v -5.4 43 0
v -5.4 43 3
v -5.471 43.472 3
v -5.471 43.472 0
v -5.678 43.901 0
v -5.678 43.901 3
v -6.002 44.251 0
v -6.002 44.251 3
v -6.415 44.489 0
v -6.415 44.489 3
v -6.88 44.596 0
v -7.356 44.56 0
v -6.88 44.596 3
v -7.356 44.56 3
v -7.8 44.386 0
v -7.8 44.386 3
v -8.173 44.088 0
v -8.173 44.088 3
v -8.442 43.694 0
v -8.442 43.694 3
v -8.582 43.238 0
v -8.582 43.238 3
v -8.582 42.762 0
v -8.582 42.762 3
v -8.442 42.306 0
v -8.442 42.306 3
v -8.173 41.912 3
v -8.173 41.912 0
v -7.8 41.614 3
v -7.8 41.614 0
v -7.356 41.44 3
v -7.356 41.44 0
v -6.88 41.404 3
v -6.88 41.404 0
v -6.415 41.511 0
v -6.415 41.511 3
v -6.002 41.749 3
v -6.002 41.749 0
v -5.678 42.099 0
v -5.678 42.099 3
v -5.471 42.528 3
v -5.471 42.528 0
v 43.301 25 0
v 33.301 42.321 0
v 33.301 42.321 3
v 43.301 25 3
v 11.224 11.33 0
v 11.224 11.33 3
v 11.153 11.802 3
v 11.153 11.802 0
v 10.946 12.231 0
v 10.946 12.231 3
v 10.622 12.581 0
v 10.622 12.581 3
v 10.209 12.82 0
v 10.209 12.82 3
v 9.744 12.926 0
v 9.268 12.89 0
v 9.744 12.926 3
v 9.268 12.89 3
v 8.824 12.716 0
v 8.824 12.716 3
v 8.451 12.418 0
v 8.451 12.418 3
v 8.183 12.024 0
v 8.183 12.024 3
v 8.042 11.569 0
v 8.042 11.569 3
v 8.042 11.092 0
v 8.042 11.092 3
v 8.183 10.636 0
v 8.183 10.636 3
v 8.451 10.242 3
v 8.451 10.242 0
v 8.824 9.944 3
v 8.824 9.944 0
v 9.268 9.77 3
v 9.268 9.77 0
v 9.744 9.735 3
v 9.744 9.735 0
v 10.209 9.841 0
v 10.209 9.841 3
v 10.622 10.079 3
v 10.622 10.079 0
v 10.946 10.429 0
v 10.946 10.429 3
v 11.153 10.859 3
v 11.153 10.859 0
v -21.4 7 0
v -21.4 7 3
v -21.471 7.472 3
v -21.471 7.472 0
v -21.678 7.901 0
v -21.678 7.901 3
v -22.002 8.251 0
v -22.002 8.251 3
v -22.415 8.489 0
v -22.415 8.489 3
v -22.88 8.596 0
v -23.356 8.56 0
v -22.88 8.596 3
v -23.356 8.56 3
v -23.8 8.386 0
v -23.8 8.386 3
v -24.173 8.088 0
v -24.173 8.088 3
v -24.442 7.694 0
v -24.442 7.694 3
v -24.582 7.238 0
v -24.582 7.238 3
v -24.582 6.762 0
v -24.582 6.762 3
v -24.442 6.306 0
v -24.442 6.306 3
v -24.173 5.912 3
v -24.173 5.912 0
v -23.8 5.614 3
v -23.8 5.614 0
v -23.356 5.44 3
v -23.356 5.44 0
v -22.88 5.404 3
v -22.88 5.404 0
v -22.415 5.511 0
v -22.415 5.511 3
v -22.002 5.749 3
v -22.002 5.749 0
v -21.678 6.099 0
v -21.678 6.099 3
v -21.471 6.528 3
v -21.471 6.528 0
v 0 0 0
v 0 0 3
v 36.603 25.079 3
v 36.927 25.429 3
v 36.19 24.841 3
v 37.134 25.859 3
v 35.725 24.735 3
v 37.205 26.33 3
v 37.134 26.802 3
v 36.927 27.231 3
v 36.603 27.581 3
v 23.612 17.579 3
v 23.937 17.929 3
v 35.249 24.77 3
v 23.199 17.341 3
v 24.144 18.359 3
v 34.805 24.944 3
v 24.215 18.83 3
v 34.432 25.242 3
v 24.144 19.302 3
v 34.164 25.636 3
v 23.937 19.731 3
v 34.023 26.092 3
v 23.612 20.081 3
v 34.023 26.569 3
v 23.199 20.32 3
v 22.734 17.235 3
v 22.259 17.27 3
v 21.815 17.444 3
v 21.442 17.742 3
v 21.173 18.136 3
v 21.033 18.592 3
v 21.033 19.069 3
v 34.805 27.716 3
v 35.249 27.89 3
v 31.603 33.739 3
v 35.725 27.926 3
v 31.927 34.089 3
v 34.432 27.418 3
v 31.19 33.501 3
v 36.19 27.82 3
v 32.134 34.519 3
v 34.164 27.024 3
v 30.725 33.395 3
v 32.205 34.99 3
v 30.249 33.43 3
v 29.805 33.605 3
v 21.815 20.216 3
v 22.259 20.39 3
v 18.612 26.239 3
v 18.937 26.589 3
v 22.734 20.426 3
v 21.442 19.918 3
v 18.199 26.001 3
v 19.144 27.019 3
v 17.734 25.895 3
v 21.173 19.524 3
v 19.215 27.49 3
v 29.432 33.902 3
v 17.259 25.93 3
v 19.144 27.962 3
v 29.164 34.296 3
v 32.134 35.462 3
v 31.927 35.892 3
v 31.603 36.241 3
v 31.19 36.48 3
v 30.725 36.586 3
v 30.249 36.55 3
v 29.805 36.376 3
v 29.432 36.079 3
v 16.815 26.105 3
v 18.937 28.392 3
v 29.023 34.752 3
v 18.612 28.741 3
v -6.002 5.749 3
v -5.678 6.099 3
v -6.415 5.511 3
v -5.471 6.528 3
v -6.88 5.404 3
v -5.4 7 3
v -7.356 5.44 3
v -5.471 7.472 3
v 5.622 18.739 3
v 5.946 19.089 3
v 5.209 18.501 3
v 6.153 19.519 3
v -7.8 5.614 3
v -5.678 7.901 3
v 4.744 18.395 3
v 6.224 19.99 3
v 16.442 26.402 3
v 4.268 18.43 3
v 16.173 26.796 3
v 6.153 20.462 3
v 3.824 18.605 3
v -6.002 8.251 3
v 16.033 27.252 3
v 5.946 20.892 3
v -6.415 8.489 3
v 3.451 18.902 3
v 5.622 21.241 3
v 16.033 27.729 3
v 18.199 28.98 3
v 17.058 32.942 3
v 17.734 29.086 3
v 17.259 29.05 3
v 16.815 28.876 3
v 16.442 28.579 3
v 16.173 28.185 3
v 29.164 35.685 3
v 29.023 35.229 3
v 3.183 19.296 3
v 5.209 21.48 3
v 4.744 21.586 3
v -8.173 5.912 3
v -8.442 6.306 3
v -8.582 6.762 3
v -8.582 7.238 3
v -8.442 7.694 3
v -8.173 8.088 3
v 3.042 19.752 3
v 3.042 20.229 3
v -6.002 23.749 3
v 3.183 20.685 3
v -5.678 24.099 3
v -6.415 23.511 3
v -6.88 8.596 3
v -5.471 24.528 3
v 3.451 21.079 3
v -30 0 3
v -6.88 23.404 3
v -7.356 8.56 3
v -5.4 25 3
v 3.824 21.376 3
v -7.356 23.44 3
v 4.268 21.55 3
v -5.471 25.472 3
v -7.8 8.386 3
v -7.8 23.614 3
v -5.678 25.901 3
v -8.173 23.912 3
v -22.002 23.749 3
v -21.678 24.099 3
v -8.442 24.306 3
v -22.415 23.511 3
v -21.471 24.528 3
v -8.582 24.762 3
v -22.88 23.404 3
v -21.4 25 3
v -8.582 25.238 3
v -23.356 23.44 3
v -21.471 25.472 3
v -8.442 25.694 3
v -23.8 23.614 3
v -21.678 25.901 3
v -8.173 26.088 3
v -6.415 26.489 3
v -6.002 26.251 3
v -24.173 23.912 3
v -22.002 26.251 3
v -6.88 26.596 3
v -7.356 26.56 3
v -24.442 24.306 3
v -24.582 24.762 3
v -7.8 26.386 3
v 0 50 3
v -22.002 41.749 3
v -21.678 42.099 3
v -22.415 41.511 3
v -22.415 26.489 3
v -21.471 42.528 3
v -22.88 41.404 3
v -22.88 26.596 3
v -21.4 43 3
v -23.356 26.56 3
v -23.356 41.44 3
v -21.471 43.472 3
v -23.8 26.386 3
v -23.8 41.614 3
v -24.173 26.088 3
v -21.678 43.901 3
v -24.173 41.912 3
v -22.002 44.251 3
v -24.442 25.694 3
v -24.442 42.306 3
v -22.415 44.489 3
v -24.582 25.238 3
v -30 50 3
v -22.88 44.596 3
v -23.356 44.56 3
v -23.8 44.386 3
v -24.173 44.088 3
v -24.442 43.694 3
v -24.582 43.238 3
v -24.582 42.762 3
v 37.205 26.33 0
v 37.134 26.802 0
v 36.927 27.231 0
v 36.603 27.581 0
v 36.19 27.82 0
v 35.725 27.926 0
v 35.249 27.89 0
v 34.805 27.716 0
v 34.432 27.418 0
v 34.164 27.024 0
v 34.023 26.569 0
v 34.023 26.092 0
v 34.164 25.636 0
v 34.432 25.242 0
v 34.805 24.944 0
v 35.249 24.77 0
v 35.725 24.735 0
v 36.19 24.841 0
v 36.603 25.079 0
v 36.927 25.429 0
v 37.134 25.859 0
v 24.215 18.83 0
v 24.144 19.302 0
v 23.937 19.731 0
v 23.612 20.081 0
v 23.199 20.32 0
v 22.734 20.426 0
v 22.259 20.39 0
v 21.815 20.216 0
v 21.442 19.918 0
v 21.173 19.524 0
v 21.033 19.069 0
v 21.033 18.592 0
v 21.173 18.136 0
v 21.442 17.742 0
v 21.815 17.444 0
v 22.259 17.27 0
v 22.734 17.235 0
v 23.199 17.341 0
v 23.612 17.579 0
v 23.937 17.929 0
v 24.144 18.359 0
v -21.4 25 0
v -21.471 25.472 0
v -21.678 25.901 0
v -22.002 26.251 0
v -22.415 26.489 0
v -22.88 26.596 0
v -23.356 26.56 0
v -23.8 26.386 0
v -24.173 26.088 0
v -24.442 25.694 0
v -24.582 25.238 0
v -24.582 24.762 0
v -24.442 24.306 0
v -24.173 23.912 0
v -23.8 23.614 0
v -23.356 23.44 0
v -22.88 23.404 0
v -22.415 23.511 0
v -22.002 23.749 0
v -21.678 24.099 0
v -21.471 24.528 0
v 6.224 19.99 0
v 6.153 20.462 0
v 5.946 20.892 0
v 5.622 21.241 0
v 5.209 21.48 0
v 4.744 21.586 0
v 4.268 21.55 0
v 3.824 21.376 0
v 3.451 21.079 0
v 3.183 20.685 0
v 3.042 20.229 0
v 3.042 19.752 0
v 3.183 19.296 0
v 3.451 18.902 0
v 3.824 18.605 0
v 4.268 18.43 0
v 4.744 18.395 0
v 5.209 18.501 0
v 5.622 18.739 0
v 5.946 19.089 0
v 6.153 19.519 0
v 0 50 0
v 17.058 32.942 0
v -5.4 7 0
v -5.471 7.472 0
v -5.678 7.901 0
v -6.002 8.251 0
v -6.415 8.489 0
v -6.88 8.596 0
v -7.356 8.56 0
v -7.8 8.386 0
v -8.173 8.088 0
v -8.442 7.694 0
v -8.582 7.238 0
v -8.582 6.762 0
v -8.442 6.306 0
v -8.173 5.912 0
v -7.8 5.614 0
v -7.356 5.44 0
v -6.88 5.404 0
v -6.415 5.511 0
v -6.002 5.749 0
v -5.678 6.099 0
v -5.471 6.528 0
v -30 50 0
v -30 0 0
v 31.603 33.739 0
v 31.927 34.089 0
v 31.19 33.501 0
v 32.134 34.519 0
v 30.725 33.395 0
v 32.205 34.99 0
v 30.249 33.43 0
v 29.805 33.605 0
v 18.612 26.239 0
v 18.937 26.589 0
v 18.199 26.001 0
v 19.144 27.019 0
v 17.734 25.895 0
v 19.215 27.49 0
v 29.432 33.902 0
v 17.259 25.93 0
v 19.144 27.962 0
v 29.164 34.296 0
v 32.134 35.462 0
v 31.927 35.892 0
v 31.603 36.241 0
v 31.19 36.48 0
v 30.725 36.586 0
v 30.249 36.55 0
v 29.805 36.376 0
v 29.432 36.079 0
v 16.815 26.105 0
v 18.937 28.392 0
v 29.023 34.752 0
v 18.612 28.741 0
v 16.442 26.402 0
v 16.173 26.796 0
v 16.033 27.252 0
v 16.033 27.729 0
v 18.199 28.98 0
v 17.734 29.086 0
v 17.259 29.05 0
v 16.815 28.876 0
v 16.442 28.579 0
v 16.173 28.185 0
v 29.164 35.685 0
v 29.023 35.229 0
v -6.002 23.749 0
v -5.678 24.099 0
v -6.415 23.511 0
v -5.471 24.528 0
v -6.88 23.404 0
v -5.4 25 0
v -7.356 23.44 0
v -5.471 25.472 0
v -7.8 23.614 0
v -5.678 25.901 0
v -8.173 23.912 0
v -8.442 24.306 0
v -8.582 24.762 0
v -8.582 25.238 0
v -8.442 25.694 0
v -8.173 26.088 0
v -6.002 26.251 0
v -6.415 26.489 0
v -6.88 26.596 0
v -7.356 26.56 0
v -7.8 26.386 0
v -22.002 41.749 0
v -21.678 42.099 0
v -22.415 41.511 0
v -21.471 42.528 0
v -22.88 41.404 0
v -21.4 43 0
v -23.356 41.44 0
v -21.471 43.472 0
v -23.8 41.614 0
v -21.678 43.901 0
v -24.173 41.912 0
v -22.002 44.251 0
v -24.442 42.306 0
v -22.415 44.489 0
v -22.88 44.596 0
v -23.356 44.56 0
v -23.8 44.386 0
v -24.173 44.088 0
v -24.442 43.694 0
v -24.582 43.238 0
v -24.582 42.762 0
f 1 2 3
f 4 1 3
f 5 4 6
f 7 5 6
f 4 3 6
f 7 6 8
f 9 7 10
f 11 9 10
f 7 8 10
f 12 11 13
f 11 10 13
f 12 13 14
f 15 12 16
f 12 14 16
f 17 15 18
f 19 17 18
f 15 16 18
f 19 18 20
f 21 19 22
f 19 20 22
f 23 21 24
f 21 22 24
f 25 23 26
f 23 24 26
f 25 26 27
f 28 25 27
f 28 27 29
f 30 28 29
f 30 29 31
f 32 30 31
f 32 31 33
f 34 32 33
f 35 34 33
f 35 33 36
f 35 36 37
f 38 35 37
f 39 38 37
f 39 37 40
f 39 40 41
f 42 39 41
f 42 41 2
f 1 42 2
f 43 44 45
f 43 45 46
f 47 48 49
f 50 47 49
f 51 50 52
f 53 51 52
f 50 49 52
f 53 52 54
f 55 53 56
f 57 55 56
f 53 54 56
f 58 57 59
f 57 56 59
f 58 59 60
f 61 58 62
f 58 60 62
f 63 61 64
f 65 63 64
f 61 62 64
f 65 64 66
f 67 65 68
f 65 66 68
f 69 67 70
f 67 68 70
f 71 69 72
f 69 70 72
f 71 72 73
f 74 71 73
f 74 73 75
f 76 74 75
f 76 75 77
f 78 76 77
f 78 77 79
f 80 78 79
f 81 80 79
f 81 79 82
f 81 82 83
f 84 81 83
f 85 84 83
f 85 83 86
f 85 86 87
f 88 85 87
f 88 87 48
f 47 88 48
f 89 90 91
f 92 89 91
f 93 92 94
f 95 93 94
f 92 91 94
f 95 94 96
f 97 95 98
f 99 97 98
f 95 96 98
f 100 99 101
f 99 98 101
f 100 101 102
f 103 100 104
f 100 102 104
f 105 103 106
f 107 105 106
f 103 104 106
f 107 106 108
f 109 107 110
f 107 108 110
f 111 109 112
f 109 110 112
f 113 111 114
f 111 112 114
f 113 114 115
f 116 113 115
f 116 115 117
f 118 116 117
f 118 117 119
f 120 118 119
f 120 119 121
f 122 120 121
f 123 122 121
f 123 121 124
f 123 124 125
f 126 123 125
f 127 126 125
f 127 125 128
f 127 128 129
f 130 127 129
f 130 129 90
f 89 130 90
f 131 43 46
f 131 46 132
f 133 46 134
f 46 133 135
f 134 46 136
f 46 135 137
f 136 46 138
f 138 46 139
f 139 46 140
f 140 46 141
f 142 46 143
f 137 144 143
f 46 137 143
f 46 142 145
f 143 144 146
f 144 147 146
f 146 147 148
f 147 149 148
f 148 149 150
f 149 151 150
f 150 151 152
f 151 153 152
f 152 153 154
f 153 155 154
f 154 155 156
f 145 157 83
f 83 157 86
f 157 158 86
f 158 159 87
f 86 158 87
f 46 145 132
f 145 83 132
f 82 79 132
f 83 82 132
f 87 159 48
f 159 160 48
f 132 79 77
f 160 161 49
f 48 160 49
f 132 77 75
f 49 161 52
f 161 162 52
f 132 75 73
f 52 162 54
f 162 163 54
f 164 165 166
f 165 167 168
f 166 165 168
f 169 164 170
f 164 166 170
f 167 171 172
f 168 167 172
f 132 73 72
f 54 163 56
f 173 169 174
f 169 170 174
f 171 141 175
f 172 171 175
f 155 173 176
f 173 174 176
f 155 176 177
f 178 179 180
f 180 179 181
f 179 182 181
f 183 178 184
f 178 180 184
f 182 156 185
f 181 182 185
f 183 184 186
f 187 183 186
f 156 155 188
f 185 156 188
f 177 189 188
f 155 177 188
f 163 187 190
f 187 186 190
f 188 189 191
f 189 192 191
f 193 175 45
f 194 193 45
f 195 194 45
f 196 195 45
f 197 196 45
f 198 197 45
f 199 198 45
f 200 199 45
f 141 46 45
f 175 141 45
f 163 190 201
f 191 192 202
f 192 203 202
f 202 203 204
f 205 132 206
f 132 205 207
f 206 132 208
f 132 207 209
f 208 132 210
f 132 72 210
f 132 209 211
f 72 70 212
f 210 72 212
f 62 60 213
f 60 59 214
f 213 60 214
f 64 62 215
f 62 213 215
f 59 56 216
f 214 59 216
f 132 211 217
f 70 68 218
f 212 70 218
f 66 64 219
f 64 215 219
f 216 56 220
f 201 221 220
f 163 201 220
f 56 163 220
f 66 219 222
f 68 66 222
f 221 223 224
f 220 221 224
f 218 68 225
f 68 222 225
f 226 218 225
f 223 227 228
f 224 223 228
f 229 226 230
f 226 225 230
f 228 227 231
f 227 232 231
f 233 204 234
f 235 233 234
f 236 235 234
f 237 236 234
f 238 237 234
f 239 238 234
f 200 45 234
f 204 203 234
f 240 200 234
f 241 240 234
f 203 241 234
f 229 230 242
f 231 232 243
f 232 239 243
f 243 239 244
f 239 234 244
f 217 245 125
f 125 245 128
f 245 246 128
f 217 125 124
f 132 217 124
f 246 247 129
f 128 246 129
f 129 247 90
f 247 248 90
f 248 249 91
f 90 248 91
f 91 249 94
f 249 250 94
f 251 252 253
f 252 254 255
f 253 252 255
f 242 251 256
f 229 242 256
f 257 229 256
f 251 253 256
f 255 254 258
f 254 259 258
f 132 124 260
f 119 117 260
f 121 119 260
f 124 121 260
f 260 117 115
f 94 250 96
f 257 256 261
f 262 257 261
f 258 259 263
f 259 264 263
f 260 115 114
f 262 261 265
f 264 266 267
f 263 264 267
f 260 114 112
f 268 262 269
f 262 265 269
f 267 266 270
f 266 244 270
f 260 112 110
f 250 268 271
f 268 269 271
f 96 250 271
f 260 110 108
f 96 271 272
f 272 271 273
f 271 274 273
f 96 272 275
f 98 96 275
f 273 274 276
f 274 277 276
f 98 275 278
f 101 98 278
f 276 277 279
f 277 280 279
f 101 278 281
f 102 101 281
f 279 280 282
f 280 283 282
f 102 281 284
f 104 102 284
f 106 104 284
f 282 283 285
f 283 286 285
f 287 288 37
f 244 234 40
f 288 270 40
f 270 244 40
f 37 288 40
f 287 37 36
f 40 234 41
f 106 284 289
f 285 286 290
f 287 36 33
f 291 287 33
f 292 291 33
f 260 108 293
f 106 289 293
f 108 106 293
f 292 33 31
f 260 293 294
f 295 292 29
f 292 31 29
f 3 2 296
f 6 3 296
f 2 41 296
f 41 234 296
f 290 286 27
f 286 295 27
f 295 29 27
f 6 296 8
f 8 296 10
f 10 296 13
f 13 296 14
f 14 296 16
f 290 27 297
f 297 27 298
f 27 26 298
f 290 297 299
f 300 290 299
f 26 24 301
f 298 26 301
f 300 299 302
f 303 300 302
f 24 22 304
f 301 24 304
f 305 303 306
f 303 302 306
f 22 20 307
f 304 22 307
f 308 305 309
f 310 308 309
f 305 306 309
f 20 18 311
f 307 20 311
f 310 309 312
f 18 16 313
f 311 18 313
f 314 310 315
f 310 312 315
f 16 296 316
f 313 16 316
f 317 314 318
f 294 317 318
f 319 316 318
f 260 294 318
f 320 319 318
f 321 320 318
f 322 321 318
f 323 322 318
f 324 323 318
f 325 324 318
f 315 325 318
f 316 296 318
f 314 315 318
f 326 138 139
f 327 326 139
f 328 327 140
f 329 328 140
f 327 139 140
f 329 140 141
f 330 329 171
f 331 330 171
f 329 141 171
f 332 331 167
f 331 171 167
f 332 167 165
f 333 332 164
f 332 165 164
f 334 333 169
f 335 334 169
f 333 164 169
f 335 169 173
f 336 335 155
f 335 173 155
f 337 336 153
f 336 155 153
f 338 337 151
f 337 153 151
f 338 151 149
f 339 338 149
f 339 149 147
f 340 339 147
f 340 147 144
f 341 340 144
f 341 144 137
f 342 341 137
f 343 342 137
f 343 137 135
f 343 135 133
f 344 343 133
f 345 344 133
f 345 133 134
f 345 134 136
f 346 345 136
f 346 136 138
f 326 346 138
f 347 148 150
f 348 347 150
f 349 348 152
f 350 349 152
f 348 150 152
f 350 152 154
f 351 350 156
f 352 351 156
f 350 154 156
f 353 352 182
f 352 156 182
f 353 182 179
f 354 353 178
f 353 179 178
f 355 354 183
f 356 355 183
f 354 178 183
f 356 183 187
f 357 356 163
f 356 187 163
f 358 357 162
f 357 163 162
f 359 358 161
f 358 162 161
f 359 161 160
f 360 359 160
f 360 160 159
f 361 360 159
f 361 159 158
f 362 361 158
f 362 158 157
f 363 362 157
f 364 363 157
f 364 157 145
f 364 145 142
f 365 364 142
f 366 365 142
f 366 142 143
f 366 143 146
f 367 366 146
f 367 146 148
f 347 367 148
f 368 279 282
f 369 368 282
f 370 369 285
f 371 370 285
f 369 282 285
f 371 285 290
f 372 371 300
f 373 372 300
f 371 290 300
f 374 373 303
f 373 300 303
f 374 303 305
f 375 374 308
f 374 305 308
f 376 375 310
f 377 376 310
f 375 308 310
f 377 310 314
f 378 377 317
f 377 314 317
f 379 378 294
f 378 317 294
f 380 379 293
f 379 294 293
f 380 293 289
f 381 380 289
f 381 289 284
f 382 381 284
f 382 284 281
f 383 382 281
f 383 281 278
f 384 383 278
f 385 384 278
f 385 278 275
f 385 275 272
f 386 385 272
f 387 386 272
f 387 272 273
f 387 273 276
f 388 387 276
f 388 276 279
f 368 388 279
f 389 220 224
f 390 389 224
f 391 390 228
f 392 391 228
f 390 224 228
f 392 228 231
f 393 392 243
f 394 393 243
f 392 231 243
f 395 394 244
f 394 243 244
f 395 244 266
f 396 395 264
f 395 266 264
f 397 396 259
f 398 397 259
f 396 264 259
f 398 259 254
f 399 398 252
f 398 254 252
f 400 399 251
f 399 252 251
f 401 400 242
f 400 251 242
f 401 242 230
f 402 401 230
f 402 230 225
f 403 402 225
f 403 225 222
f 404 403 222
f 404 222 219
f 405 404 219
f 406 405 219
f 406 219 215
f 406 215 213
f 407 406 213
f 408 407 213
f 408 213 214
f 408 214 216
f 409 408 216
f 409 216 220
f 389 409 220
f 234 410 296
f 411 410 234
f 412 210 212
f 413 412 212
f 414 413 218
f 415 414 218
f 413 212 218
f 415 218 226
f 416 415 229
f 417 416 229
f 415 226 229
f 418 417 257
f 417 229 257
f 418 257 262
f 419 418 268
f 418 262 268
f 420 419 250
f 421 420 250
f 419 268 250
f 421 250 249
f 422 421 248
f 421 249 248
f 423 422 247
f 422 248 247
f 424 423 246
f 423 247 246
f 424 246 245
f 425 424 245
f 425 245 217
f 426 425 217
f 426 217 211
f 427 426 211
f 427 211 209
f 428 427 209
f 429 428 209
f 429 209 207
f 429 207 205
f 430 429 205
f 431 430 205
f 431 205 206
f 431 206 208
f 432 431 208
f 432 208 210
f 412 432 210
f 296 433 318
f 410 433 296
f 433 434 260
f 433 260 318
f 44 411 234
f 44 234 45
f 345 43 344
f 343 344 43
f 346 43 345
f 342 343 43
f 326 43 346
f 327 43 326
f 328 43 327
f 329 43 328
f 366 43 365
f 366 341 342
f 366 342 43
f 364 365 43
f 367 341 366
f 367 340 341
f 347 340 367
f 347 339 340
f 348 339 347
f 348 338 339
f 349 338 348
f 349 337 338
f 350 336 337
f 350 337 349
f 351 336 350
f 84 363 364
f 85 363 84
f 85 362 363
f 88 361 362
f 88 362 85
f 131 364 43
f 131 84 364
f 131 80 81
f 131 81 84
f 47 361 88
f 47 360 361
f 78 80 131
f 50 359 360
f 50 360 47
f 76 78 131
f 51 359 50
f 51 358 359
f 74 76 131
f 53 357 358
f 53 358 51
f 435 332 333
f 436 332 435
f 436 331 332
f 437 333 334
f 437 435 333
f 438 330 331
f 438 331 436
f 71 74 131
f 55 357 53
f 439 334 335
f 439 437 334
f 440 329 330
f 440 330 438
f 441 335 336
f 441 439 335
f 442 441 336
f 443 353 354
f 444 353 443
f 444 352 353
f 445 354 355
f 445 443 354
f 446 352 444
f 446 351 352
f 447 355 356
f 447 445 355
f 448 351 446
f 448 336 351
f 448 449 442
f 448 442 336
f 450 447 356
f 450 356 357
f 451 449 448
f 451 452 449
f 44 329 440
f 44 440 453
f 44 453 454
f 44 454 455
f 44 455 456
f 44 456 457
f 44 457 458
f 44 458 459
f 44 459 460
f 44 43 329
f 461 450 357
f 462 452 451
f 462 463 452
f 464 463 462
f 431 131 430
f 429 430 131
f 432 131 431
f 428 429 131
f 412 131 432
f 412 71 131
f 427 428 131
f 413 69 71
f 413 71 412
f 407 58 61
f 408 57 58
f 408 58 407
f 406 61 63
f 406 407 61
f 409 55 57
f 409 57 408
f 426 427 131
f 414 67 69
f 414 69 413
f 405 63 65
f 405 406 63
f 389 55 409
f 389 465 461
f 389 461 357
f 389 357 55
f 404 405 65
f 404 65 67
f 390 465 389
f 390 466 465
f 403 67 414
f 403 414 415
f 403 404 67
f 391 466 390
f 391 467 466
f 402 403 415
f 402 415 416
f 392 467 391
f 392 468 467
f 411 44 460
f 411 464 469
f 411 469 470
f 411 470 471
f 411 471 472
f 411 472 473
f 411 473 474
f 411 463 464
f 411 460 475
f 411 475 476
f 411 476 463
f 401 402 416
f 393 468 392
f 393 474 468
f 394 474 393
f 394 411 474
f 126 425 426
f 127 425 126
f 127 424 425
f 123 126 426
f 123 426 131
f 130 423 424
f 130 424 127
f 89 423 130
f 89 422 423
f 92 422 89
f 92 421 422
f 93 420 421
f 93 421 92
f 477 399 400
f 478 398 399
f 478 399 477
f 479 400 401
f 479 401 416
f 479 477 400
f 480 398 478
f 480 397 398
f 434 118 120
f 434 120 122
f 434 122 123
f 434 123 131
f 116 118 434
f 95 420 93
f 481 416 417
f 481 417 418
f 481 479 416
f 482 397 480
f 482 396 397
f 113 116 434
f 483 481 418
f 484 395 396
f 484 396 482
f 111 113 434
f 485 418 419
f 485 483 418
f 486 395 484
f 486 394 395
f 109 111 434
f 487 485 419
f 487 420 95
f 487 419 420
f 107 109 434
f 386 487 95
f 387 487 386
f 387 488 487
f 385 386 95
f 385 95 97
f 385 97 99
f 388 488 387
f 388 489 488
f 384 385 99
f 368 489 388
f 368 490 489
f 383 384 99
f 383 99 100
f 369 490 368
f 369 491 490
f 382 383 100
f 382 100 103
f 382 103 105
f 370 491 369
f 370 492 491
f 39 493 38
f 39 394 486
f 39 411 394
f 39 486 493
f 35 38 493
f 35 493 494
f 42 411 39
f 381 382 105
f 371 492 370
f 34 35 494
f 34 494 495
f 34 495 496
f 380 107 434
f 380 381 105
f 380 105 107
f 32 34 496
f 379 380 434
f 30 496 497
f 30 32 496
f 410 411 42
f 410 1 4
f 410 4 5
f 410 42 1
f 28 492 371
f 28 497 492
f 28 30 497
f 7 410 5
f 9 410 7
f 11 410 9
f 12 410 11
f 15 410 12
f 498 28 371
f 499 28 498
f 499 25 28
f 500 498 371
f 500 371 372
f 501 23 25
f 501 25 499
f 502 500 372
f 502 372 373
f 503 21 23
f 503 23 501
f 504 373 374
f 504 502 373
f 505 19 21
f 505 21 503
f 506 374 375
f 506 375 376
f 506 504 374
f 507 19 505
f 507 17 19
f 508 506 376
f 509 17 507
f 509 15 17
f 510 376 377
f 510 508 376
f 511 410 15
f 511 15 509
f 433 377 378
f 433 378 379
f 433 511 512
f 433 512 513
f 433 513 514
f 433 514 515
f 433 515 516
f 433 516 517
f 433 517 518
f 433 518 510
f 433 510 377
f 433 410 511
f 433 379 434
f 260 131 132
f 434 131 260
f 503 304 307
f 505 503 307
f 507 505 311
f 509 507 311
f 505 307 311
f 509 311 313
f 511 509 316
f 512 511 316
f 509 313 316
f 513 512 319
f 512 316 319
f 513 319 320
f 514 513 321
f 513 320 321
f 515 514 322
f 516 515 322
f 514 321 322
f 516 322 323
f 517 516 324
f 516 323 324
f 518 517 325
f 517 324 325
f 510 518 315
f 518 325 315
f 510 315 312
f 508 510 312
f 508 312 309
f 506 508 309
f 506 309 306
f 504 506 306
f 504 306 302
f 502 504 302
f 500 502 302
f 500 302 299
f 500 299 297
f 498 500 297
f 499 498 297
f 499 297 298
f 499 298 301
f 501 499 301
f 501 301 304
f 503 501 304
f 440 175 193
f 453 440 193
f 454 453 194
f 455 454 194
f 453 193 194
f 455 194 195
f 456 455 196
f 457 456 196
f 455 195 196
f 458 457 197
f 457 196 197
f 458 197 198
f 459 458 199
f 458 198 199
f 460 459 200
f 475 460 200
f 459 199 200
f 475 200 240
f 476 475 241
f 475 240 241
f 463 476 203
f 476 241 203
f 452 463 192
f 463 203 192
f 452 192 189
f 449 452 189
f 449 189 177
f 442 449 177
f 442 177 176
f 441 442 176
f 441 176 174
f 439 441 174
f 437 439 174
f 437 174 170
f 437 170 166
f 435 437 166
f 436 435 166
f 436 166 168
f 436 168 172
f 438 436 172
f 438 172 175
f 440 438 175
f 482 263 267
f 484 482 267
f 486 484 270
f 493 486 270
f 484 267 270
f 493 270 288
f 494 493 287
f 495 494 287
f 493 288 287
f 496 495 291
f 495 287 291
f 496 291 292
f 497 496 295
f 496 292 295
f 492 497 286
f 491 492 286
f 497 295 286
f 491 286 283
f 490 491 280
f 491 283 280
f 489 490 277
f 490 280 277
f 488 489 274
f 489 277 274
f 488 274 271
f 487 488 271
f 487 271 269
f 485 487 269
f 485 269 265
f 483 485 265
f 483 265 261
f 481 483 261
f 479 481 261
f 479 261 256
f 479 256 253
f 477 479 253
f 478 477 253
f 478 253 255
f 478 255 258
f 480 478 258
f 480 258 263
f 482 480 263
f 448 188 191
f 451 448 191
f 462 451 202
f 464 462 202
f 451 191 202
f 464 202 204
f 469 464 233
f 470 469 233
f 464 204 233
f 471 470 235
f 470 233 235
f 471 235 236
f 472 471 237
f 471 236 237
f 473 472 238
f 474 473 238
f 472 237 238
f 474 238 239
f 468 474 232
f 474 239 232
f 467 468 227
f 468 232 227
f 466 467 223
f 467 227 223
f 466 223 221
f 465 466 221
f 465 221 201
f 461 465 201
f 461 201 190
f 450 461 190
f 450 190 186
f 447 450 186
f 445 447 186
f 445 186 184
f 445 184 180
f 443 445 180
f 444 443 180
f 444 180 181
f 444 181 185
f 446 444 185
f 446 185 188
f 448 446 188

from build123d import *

# Parameters (mm, degrees)
EXTRUDE_1_DEPTH     = 3
SKETCH_2_R          = 1.6
CUT_EXTRUDE_1_DEPTH = 67.211781429


with BuildPart() as part:
    # 草图1 → 凸台-拉伸1 (new body)
    with BuildSketch(Plane.XY):
        Polygon((0, 0), (-30, 0), (-30, 50), (0, 50), (17.057713659, 32.942286341), (33.301270189, 42.320508076), (43.301270189, 25), align=None)
    extrude(amount=EXTRUDE_1_DEPTH)

    # 草图2 → 切除-拉伸1 (cut, through all)
    with BuildSketch(Plane.XY.offset(3)):
        with Locations((-23, 43)):
            Circle(SKETCH_2_R)
        with Locations((-7, 43)):
            Circle(SKETCH_2_R)
        with Locations((-23, 7)):
            Circle(SKETCH_2_R)
        with Locations((-7, 7)):
            Circle(SKETCH_2_R)
        with Locations((-23, 25)):
            Circle(SKETCH_2_R)
        with Locations((-7, 25)):
            Circle(SKETCH_2_R)
        with Locations((30.605117767, 34.990381057)):
            Circle(SKETCH_2_R)
        with Locations((35.605117767, 26.330127019)):
            Circle(SKETCH_2_R)
        with Locations((22.61473671, 18.830127019)):
            Circle(SKETCH_2_R)
        with Locations((17.61473671, 27.490381057)):
            Circle(SKETCH_2_R)
        with Locations((4.624355653, 19.990381057)):
            Circle(SKETCH_2_R)
        with Locations((9.624355653, 11.330127019)):
            Circle(SKETCH_2_R)
    extrude(amount=-CUT_EXTRUDE_1_DEPTH, mode=Mode.SUBTRACT)


solid = part.part
